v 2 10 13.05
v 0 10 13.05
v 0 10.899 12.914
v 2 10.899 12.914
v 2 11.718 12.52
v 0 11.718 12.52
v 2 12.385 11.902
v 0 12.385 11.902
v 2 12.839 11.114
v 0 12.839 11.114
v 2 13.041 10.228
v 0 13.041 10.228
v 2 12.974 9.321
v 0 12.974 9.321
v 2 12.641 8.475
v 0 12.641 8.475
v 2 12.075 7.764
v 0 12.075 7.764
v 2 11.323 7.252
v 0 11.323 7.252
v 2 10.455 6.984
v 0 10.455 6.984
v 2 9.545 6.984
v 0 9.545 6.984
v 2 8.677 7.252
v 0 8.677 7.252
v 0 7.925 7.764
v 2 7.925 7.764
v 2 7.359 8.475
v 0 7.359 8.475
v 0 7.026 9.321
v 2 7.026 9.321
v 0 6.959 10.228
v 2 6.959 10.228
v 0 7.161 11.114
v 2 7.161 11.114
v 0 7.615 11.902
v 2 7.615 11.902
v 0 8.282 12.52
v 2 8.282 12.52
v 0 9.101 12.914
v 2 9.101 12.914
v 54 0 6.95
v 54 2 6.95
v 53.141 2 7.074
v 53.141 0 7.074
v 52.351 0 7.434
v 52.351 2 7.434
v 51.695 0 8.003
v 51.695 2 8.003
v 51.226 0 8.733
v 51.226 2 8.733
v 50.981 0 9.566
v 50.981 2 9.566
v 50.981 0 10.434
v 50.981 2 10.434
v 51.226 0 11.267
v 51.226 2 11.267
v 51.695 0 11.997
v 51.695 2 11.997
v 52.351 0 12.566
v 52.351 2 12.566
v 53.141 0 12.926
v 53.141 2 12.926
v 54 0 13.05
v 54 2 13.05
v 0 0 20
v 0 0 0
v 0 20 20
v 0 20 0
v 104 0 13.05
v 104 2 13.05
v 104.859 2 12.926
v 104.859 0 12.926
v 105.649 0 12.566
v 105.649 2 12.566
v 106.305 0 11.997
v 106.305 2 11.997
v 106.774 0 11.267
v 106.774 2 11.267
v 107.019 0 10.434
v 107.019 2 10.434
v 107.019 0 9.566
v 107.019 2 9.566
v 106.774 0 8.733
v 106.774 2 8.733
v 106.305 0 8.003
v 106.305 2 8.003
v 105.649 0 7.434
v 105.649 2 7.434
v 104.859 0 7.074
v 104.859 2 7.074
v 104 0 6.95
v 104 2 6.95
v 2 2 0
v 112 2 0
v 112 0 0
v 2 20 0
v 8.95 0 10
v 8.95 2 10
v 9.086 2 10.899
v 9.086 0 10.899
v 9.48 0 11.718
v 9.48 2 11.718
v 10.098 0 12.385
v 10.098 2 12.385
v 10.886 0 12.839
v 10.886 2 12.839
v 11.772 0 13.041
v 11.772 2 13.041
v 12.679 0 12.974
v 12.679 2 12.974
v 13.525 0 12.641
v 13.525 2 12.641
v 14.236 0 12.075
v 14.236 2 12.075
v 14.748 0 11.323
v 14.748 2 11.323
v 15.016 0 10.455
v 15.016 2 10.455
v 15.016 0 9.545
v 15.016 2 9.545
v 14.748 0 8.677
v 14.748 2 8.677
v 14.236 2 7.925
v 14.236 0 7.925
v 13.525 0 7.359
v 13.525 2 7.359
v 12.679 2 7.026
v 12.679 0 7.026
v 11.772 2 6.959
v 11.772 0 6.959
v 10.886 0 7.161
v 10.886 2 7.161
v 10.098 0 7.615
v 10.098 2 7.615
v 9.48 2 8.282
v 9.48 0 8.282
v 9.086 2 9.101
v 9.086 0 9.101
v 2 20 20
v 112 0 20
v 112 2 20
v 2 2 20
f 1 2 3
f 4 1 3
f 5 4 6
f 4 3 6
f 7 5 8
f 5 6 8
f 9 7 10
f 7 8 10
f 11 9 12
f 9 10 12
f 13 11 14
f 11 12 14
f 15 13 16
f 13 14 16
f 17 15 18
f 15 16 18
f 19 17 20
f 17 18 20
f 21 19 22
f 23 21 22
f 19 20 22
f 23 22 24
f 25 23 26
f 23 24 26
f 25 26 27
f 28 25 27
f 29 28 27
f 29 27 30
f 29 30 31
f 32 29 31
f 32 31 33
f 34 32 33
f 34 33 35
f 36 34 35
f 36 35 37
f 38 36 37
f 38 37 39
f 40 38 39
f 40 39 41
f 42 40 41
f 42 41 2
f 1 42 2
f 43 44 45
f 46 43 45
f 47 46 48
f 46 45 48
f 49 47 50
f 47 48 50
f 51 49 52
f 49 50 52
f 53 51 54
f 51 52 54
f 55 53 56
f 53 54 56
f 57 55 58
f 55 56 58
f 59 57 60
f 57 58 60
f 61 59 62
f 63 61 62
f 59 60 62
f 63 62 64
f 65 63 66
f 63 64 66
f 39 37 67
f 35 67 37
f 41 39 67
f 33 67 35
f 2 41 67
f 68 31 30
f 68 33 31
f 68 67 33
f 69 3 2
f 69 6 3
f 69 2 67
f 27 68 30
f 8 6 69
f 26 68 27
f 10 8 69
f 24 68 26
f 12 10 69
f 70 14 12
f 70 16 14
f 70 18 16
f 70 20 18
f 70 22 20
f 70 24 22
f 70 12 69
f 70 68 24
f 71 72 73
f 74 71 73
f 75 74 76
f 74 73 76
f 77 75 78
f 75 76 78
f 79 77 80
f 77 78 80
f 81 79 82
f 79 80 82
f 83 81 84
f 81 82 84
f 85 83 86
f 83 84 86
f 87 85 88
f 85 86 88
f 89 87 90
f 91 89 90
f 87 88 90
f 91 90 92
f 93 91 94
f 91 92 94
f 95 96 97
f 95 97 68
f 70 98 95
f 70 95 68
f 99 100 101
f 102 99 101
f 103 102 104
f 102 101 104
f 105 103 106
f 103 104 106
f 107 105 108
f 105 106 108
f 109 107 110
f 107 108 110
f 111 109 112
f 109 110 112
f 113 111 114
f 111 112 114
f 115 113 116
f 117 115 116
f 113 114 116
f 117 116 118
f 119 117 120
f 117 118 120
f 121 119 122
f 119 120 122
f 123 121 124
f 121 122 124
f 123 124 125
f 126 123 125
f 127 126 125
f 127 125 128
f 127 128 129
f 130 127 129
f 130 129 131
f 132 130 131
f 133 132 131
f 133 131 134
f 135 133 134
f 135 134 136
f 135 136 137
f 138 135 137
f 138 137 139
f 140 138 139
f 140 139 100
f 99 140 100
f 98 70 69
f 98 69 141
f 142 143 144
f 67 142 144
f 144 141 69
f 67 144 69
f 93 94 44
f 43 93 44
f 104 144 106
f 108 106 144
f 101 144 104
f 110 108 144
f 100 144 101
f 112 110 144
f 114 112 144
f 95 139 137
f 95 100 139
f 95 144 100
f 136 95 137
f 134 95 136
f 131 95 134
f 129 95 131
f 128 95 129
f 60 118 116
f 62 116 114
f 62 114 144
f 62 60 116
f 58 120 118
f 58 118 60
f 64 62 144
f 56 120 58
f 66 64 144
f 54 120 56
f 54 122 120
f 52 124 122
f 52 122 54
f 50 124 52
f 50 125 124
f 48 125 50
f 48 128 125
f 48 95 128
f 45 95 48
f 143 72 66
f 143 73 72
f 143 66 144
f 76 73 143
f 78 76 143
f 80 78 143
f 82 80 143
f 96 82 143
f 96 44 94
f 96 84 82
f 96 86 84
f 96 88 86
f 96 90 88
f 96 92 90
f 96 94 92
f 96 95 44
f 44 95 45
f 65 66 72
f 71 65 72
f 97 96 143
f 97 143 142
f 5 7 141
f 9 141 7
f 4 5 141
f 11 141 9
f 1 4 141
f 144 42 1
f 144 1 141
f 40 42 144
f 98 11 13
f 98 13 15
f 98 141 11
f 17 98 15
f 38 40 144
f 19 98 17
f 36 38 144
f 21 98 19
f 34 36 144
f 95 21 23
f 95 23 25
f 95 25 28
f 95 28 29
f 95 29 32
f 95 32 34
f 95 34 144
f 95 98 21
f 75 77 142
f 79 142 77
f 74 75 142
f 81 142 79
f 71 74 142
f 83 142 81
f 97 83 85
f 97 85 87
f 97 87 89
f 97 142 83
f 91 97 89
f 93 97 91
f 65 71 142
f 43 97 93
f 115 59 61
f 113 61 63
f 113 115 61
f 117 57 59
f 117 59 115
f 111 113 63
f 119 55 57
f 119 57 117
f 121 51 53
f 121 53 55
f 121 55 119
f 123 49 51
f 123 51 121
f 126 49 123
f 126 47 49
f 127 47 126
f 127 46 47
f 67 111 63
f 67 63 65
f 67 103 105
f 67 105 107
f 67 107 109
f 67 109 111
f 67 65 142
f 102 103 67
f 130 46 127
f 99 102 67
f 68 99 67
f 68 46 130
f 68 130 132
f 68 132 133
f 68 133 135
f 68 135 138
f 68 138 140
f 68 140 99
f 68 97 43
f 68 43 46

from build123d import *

# Parameters (mm, degrees)
BOSS_EXTRUDE1_DEPTH = 20
SKETCH2_R           = 3.05
CUT_EXTRUDE1_DEPTH  = 116.516232626
SKETCH3_R           = 3.05
CUT_EXTRUDE2_DEPTH  = 116.1868048


with BuildPart() as part:
    # Sketch1 → Boss-Extrude1 (new body)
    with BuildSketch(Plane.XY):
        Polygon((0, 0), (0, 20), (2, 20), (2, 2), (112, 2), (112, 0), align=None)
    extrude(amount=BOSS_EXTRUDE1_DEPTH)

    # Sketch2 → Cut-Extrude1 (cut, through all)
    with BuildSketch(Plane.ZY):
        with Locations((10, 10)):
            Circle(SKETCH2_R)
    extrude(amount=-CUT_EXTRUDE1_DEPTH, mode=Mode.SUBTRACT)

    # Sketch3 → Cut-Extrude2 (cut, through all)
    with BuildSketch(Plane(origin=(0, 2, 0), x_dir=(1, 0, 0), z_dir=(0, 1, 0))):
        with Locations(Location((12, -10, 0), (0, 0, 180))):
            Circle(SKETCH3_R)
        with BuildLine():
            Line((54, -13.05), (104, -13.05))
            ThreePointArc((104, -13.05), (107.05, -10), (104, -6.95))
            Line((104, -6.95), (54, -6.95))
            ThreePointArc((54, -6.95), (50.95, -10), (54, -13.05))
        make_face()
    extrude(amount=-CUT_EXTRUDE2_DEPTH, mode=Mode.SUBTRACT)


solid = part.part
